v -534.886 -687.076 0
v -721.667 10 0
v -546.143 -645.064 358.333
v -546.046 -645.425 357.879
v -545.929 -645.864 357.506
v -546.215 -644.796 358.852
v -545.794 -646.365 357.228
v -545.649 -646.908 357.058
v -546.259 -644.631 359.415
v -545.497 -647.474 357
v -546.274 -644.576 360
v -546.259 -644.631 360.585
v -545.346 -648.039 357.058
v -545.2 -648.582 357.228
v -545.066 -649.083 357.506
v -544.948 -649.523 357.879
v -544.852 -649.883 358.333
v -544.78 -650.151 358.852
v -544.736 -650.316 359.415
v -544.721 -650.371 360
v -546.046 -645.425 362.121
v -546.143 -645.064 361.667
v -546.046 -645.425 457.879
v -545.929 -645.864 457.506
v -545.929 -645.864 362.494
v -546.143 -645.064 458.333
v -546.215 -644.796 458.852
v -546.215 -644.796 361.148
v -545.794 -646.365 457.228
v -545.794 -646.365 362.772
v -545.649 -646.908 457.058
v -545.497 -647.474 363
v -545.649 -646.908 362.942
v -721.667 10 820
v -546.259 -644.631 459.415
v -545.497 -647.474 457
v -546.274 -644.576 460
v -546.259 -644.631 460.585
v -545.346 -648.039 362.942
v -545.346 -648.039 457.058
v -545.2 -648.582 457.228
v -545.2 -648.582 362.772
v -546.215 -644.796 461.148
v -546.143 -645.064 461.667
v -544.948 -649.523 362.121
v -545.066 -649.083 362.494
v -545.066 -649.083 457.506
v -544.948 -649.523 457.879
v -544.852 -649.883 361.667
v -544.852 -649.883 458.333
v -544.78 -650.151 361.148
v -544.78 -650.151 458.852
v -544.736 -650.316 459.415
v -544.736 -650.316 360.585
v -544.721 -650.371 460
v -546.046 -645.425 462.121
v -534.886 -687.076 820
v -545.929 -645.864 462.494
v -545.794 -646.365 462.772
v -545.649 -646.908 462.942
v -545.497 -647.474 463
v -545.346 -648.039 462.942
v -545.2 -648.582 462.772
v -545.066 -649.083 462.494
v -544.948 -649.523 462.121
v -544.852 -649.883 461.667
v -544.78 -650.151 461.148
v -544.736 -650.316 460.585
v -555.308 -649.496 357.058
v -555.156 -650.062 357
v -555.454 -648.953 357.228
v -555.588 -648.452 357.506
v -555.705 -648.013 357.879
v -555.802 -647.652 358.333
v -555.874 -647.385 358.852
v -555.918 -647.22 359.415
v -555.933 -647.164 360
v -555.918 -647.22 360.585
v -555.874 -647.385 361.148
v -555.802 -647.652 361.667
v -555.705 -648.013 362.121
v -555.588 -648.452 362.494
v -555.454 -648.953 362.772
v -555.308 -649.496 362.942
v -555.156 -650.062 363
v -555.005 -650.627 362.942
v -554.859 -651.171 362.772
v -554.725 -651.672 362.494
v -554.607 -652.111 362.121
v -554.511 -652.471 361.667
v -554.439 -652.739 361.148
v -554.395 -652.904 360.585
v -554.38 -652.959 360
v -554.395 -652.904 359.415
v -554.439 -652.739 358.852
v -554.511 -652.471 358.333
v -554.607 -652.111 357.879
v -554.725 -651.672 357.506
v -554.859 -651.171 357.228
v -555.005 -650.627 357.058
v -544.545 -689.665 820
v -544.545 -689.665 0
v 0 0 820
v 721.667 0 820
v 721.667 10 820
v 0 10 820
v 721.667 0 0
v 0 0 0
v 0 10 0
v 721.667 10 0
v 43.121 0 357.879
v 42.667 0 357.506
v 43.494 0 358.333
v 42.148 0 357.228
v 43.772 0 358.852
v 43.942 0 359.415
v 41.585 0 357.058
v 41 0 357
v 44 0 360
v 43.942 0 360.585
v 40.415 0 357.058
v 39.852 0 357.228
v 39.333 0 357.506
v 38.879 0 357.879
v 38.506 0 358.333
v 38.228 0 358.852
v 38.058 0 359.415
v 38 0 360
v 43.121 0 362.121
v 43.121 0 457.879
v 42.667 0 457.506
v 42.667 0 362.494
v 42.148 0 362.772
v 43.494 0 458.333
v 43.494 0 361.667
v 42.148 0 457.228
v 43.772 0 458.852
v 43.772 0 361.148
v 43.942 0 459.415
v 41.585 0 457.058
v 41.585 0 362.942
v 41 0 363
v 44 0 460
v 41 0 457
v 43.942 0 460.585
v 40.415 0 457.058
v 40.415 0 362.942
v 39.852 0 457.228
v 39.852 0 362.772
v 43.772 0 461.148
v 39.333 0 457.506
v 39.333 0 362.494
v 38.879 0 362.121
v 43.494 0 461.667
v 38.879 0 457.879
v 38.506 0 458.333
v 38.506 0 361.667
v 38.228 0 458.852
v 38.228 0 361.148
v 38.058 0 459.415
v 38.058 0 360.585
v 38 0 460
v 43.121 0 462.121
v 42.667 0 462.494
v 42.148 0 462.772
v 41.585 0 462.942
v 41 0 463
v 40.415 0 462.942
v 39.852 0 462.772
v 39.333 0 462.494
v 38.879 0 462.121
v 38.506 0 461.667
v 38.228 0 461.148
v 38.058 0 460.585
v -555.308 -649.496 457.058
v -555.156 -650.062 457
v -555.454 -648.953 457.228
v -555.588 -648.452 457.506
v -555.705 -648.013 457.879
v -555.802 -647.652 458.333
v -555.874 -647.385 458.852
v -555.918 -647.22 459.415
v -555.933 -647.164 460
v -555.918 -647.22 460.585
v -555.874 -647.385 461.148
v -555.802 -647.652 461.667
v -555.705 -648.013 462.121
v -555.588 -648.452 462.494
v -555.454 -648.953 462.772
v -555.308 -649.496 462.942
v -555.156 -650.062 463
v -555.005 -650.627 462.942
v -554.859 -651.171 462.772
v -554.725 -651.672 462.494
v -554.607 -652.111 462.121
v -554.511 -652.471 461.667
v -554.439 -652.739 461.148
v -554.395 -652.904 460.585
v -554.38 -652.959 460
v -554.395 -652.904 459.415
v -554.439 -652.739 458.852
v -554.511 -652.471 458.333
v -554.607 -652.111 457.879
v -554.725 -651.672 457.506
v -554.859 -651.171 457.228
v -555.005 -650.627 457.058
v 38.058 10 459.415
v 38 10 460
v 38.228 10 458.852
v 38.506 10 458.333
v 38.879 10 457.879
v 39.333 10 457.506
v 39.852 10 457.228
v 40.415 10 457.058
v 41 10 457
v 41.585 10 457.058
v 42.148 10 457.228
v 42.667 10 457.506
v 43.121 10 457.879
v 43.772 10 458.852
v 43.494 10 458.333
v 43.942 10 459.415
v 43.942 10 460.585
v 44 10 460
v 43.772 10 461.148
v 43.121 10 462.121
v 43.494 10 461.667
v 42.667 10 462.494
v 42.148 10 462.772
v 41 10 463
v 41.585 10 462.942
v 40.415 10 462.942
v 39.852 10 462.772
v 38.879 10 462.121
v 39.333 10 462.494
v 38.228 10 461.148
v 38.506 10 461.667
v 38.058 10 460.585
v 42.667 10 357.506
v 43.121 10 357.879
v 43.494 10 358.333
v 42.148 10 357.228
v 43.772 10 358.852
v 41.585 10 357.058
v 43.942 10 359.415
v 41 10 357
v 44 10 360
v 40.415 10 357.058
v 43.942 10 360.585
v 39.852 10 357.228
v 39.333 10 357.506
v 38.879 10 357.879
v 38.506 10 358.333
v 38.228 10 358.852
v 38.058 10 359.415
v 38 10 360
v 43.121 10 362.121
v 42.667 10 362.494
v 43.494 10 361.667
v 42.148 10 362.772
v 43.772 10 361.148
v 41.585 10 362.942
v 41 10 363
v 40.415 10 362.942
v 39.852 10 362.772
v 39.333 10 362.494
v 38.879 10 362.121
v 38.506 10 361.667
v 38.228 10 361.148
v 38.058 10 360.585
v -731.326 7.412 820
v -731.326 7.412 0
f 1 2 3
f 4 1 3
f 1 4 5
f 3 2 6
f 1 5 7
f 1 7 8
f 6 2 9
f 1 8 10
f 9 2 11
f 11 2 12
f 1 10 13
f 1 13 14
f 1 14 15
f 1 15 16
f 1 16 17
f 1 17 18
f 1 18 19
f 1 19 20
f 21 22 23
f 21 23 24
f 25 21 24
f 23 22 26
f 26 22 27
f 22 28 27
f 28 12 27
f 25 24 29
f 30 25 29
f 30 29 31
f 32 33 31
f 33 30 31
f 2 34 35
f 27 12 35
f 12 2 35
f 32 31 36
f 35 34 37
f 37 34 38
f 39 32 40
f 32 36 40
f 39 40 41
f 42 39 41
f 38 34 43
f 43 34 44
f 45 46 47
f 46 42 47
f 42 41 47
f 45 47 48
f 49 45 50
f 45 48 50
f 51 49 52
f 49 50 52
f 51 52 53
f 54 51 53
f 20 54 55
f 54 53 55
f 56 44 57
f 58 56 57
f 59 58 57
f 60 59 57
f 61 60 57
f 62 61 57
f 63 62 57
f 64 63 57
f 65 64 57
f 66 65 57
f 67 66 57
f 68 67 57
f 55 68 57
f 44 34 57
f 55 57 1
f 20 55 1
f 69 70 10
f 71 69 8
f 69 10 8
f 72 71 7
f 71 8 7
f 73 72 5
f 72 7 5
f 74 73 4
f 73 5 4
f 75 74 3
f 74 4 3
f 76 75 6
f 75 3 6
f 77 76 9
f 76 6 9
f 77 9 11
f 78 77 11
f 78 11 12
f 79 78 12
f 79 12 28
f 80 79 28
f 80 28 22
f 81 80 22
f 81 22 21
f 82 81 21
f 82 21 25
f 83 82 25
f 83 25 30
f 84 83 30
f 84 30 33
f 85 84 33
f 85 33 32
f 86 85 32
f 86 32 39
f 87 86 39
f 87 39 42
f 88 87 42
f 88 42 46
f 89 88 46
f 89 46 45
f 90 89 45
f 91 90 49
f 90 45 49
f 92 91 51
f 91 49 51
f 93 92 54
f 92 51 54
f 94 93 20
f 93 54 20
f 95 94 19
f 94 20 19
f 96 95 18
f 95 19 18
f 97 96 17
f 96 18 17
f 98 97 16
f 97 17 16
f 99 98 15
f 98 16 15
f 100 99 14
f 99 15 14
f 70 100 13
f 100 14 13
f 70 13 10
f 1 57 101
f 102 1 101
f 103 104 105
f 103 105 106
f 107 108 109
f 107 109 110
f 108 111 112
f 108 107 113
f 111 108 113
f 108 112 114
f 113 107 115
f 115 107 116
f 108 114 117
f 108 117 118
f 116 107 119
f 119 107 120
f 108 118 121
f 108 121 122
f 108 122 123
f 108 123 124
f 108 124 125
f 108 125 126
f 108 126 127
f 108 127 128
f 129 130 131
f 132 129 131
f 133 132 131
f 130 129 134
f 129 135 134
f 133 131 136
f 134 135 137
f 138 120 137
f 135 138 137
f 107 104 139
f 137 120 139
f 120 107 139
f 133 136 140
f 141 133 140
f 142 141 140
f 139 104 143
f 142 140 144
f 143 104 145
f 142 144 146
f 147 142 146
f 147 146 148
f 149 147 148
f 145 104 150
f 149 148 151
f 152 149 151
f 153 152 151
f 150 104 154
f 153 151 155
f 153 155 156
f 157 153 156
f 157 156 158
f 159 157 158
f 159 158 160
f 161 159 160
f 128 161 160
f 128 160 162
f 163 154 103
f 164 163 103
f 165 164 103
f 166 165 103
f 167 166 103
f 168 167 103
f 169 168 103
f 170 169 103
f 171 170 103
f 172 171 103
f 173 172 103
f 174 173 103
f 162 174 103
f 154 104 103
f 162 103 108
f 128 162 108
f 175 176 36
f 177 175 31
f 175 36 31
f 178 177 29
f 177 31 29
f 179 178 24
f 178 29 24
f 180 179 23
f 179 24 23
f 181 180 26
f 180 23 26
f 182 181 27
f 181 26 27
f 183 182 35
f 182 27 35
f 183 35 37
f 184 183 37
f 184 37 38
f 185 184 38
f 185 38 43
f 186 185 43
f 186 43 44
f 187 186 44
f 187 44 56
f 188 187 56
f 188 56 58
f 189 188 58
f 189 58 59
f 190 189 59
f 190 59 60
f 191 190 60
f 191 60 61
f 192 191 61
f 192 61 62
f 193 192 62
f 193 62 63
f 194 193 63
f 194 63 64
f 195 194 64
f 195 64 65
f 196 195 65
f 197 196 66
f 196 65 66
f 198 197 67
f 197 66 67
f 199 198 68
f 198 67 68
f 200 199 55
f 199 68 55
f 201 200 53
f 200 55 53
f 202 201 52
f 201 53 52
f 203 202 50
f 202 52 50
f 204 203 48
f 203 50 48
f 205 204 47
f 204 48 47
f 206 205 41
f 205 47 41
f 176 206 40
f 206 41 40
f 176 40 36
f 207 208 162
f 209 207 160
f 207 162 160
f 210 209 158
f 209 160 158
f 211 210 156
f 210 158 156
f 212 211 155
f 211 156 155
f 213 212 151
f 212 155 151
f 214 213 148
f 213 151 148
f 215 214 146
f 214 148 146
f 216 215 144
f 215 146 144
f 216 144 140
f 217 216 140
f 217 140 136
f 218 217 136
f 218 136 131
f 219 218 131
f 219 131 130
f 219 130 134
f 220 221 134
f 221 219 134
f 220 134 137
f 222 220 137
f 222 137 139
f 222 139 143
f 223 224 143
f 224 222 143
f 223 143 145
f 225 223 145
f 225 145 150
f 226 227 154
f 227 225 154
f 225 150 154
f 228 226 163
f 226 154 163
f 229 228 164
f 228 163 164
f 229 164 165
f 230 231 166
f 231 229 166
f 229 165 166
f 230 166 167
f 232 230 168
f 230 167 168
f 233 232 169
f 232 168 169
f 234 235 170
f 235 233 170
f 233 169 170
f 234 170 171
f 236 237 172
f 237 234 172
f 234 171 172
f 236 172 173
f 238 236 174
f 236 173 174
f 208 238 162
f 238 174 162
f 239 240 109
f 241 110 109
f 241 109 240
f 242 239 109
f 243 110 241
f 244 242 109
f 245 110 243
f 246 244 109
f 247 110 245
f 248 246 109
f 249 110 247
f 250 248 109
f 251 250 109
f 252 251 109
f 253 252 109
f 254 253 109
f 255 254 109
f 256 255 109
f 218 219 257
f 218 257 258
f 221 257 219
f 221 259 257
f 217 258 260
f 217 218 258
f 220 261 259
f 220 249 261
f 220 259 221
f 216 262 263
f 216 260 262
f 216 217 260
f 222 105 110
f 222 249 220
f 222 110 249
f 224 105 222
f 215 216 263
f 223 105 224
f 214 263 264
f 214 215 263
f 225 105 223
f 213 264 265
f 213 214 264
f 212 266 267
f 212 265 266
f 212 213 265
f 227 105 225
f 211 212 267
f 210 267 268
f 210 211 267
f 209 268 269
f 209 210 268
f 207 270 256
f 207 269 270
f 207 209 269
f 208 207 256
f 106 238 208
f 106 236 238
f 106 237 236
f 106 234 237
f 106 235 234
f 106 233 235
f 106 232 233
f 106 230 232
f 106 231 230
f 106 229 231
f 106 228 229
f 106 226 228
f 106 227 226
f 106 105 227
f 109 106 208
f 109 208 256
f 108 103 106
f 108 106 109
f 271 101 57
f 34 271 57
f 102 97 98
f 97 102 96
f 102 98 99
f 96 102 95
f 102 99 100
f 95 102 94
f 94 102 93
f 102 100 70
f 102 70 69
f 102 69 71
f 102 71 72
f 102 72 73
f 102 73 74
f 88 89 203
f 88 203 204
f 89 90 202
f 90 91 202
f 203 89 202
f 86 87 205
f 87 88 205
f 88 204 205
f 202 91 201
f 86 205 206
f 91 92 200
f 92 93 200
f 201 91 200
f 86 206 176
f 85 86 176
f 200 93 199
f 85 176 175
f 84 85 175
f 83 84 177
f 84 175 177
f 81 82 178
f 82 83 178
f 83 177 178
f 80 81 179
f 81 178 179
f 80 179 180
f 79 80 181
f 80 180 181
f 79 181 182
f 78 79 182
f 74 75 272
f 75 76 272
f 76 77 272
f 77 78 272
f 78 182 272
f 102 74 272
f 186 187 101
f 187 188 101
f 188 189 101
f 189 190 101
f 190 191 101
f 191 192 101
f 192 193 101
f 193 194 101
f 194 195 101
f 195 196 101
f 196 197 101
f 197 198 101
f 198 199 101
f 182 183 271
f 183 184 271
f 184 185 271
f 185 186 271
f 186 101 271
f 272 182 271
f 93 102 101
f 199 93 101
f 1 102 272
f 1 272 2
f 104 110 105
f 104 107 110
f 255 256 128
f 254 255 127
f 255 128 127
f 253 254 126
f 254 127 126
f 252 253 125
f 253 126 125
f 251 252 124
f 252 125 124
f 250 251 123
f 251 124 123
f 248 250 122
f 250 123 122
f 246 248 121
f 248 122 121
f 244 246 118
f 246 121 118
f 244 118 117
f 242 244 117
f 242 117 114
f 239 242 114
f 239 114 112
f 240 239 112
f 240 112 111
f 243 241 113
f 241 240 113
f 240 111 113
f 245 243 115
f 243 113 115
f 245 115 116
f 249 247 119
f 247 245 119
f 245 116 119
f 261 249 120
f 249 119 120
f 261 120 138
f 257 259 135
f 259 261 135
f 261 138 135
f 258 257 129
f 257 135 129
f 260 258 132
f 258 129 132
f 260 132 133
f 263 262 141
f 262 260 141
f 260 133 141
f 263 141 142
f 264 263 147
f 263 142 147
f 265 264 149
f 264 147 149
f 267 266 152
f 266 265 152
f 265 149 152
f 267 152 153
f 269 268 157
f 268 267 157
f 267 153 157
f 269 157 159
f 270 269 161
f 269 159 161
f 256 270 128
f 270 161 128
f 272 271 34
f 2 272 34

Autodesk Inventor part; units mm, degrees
ref_plane "YZ Plane" through (0, 0, 0) normal (1, 0, 0) x (0, 1, 0)
ref_plane "XZ Plane" through (0, 0, 0) normal (0, 1, 0) x (-1, 0, 0)
ref_plane "XY Plane" through (0, 0, 0) normal (0, 0, 1) x (1, 0, 0)
sketch "Sketch1" plane through (0, 0, 0) normal (0, 1, 0) x (-1, 0, 0)
  line L0 (0, 0) -> (-721.6667, 0)
  line L1 (-721.6667, 0) -> (-721.6667, 820)
  line L2 (-721.6667, 820) -> (0, 820)
  line L3 (0, 820) -> (0, 0)
  line L4 (0, 410) -> (-41, 410)
  line L5 (-41, 410) -> (-41, 460)
  line L6 (-41, 460) -> (-41, 360)
  circle A0 centre (-41, 460) radius 3
  circle A1 centre (-41, 360) radius 3
  dimension "ancho_m" = 721.6667
  dimension "h_inf" = 820
  dimension "d2" = 41
  dimension "d3" = 50
  dimension "d4" = 100
  dimension "d5" = 6
  dimension "d6" = 6
extrude "Extrusion1" add sketch "Sketch1" along normal blind 10
sketch "Boceto10" plane through (0, 0, 820) normal (0, 0, 1) x (1, 0, 0)
  line L0 (721.6667, 10) -> (0, 10) projected
  line L1 (0, 10) -> (-721.6667, 10)
  line L2 (-721.6667, 10) -> (-534.8856, -687.0765)
  line L3 (-721.6667, 10) -> (0, 10) construction
  line L4 (-534.8856, -687.0765) -> (-544.5448, -689.6647)
  line L5 (-544.5448, -689.6647) -> (-731.3259, 7.4118)
  line L6 (-731.3259, 7.4118) -> (-721.6667, 10)
  point P0 (0, 0)
  dimension "d49" = 721.6667
  dimension "d50" = 721.6667
  dimension "angulo" = 75
  dimension "d52" = 10
  dimension "d53" = 721.6667
extrude "Extrusión10" add sketch "Boceto10" against normal blind 820
sketch "Boceto11" plane through (-534.8856, -687.0765, 820) normal (0.9659258, 0.258819, 0) x (0, 0, -1)
  line L0 (0, 721.6667) -> (0, 0) projected
  line L1 (0, 0) -> (820, 0) projected
  line L2 (820, 721.6667) -> (820, 0) projected
  line L3 (0, 721.6667) -> (820, 721.6667) projected
  line L4 (0, 0) -> (820, 0) projected
  line L5 (410, 0) -> (410, 41)
  line L6 (410, 41) -> (360, 41)
  line L7 (360, 41) -> (460, 41)
  circle A0 centre (360, 41) radius 3
  circle A1 centre (460, 41) radius 3
  point P0 (820, 525.2263)
  dimension "d56" = 41
  dimension "d57" = 50
  dimension "d58" = 100
  dimension "d59" = 6
  dimension "d60" = 6
extrude "Extrusión11" cut sketch "Boceto11" against normal up to next contours A0 | A1
equation "\"d2\" = 0.05 * h_inf"
equation "\"d49\" = ancho_m"
equation "\"d50\" = ancho_m"
equation "\"d52\" = espesor"
equation "\"d53\" = ancho_m"
equation "\"d54\" = h_inf"
equation "\"d56\" = 0.05 * h_inf"
equation "\"d61\" = h_inf"
equation "\"espesor\" = 10"
properties part number "puerta_inf"
